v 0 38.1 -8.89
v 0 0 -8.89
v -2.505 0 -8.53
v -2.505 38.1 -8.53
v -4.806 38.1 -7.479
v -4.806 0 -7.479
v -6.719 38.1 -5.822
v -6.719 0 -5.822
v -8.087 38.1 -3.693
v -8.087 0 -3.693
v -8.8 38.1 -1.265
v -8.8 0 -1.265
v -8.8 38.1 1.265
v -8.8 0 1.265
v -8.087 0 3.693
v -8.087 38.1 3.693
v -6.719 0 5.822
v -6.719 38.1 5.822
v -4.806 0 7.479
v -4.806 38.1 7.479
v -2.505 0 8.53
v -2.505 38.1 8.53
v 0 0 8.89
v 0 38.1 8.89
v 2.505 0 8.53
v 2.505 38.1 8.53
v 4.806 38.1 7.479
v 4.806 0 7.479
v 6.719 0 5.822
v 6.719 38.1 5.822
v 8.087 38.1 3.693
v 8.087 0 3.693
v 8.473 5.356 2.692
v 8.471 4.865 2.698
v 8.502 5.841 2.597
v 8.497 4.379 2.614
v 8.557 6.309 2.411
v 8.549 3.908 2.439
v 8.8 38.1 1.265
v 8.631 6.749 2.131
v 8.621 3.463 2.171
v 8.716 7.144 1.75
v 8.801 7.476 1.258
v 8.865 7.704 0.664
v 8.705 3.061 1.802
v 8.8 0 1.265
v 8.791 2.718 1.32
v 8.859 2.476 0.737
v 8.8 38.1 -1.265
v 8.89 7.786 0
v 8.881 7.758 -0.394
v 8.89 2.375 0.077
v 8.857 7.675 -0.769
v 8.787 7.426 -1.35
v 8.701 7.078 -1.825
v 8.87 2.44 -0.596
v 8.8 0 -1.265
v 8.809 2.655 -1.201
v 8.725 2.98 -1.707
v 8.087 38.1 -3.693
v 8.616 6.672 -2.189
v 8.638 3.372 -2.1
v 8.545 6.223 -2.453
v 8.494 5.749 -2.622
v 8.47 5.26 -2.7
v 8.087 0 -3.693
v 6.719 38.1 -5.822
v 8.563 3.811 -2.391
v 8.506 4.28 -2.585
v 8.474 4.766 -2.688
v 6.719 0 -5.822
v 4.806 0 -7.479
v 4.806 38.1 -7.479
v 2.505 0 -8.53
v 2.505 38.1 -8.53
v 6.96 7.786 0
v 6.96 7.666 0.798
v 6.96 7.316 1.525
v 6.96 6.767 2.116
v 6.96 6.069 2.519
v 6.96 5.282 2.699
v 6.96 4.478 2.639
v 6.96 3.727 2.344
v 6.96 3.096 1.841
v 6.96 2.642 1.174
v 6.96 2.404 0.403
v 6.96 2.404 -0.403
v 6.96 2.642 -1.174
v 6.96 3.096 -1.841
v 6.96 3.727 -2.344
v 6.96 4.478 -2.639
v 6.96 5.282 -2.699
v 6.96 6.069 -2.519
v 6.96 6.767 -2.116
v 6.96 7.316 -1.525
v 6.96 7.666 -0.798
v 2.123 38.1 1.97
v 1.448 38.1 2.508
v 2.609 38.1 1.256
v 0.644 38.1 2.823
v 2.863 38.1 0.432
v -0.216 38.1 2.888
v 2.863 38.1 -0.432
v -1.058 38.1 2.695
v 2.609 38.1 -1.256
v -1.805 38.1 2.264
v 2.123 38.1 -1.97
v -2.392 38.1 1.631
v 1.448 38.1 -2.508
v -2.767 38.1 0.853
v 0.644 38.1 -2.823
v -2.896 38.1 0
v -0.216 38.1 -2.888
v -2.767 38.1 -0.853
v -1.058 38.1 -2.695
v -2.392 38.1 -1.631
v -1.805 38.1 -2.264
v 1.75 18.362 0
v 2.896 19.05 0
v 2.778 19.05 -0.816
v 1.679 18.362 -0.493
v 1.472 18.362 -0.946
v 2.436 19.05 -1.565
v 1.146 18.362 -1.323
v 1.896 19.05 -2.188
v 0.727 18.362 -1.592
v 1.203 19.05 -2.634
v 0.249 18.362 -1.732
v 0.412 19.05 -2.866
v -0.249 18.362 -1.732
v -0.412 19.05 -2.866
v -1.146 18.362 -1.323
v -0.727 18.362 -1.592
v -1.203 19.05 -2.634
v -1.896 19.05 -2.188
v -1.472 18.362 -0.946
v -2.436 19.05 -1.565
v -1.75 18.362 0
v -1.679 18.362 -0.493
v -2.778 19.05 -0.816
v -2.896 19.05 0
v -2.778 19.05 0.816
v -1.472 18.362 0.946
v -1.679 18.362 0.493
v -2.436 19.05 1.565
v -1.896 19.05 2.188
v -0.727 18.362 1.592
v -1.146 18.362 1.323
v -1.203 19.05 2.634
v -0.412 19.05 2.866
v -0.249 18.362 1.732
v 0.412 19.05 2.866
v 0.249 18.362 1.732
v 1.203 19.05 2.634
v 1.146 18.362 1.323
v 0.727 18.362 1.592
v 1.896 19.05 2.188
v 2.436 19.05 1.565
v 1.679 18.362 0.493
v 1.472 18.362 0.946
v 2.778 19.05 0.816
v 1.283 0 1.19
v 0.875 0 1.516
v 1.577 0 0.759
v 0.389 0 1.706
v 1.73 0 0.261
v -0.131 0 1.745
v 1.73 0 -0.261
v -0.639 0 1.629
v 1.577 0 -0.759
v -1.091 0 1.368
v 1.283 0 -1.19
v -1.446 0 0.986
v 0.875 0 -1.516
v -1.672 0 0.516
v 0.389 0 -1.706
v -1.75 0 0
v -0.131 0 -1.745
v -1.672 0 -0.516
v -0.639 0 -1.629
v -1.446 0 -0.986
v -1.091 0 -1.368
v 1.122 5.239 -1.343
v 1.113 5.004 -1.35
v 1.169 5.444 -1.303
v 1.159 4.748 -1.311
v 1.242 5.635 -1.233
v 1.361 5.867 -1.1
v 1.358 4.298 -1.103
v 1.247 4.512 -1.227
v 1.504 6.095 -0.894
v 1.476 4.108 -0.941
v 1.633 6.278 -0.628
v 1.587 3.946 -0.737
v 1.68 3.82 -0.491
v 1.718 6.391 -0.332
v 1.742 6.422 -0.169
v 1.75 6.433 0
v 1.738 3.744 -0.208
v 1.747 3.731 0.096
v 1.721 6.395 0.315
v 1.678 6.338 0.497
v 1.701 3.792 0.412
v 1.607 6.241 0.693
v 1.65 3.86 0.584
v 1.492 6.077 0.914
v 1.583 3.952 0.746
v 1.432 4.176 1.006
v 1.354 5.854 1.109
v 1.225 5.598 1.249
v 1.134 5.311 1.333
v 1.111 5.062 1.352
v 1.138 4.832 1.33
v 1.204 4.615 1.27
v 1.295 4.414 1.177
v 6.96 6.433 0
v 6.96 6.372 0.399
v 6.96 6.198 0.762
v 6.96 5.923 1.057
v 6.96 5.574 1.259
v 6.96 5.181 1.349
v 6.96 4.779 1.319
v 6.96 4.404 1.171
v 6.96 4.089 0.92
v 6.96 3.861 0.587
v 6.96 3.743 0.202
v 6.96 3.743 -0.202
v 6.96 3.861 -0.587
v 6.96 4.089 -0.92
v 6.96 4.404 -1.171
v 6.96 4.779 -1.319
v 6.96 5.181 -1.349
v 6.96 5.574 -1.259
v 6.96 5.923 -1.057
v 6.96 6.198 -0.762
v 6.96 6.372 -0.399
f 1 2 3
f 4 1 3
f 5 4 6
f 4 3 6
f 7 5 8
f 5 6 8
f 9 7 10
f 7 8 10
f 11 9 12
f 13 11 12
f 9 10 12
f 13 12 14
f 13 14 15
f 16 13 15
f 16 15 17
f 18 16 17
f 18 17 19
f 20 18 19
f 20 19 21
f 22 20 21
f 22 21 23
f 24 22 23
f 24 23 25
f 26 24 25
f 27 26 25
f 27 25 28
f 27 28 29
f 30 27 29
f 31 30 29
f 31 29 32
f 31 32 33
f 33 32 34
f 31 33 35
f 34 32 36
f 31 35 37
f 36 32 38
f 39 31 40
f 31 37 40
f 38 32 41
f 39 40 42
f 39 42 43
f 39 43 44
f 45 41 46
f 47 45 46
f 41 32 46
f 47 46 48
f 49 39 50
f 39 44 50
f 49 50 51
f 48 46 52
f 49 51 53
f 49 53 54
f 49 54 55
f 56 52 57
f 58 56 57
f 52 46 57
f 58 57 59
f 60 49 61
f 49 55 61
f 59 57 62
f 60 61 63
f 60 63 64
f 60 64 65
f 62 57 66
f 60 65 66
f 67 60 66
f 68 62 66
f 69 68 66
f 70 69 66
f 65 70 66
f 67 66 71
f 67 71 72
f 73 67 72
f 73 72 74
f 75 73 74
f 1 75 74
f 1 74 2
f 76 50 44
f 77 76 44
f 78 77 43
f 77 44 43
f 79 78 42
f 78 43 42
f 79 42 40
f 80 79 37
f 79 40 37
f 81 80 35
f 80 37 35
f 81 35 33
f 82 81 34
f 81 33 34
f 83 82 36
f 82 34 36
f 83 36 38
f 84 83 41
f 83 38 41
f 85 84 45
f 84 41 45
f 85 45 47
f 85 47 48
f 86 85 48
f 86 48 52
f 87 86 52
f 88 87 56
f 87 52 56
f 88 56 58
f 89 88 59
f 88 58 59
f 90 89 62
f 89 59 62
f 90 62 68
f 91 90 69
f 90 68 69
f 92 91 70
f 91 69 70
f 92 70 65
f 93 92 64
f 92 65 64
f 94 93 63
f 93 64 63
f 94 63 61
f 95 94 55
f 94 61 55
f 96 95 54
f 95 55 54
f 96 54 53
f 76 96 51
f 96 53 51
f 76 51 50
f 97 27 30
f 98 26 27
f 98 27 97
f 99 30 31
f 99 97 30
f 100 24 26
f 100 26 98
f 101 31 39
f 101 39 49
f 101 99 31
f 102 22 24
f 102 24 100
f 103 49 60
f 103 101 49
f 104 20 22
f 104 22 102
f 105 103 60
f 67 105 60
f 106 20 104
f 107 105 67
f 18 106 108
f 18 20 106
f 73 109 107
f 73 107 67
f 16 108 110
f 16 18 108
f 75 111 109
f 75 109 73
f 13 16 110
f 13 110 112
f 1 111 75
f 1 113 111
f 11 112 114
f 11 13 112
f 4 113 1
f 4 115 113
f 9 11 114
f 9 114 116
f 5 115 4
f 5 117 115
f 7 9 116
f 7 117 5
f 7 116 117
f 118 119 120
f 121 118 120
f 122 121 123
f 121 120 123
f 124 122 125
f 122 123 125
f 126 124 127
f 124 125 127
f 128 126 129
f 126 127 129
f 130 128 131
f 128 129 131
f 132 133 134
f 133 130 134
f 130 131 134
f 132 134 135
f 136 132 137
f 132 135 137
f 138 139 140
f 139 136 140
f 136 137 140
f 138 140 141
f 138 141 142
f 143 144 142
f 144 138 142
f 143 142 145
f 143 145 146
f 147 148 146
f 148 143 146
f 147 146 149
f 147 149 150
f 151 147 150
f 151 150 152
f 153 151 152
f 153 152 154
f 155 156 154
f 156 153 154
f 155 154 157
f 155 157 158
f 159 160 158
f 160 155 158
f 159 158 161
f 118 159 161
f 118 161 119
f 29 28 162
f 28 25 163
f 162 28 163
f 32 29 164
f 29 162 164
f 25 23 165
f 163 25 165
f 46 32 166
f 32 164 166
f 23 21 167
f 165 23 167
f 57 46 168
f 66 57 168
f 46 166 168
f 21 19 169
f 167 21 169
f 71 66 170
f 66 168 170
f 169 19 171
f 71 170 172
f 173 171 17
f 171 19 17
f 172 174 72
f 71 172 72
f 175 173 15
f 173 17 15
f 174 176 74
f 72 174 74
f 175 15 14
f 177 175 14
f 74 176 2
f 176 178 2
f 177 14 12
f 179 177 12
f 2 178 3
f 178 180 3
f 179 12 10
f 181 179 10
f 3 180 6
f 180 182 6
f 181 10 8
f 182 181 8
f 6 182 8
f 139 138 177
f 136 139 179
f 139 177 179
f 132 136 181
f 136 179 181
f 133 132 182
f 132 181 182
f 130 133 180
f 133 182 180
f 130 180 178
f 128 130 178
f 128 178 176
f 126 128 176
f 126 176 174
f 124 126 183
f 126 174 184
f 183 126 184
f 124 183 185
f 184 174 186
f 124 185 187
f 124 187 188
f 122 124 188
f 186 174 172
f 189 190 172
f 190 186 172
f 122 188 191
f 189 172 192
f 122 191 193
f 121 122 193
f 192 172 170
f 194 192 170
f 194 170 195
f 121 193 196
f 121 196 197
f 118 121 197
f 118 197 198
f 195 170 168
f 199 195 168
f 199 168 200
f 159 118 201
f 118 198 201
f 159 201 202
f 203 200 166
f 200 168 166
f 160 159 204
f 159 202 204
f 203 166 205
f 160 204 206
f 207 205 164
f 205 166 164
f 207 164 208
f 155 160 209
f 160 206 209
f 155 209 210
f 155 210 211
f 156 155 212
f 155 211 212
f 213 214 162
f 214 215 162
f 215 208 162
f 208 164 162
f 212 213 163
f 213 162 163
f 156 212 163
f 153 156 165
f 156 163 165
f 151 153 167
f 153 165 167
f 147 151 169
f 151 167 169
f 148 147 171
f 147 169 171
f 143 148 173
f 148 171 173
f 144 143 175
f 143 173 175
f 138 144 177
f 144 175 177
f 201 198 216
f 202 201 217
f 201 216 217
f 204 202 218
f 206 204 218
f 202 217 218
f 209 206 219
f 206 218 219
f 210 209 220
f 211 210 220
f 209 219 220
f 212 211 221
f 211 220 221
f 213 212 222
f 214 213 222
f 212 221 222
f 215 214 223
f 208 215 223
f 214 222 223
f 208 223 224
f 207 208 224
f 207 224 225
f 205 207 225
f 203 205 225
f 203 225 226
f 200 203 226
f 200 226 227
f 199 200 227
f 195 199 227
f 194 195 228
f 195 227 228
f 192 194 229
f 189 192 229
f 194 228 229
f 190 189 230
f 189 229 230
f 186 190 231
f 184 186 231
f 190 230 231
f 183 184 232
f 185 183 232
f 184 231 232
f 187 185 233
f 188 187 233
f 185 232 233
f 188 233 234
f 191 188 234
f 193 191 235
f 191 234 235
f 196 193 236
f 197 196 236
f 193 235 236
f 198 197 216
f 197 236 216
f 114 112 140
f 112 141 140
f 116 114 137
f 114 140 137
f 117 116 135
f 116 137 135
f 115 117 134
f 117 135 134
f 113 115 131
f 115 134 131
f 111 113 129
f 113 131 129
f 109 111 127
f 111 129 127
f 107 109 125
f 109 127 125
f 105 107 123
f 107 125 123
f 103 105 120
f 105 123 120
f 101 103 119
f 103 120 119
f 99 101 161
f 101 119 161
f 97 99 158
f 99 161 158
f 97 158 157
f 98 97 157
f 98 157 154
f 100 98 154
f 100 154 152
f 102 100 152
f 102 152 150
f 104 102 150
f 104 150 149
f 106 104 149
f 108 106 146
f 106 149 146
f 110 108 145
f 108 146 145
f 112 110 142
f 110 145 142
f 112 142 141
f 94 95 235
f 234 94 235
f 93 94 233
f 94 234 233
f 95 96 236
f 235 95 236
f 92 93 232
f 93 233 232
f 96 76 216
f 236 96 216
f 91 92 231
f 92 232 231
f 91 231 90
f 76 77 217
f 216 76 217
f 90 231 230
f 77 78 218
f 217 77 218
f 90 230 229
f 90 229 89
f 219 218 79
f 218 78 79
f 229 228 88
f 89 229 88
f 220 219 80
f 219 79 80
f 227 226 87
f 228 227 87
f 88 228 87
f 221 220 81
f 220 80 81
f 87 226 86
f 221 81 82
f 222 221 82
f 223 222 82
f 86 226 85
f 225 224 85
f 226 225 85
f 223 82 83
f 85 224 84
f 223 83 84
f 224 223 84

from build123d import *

# Parameters (mm, degrees)
SKETCH1_R                  = 8.89
BOSS_EXTRUDE1_DEPTH        = 38.1
F_3_0MM_DOWEL_HOLE2_D      = 3.5
F_12_CLEARANCE_HOLE1_D     = 5.7912
F_12_CLEARANCE_HOLE1_DEPTH = 19.05
F_12_CLEARANCE_HOLE1_TIP   = 1.739852008


# Read off the part's stored shape, not the designer's step: CBORE for #2 Button Head Cap Screw1
with BuildPart() as part:
    # Sketch1 → Boss-Extrude1 (new body)
    with BuildSketch(Plane(origin=(0, 0, 0), x_dir=(1, 0, 0), z_dir=(0, 1, 0))):
        with Locations(Location((0, 0, 0), (0, 0, 90))):
            Circle(SKETCH1_R)
    extrude(amount=BOSS_EXTRUDE1_DEPTH)

    # Ø3.0mm Dowel Hole2 (through all)
    with Locations(Plane(origin=(0, 38.1, 0), x_dir=(1, 0, 0), z_dir=(0, 1, 0))):
        with Locations((0, 0)):
            Hole(F_3_0MM_DOWEL_HOLE2_D / 2)

    # CBORE for #2 Button Head Cap Screw1 outl → CBORE for #2 Button Head Cap Screw1 (revolve, cut)
    with BuildSketch(Plane(origin=(0, 5.08, 0), x_dir=(0, 1, 0), z_dir=(0, 0, -1))):
        Polygon((1.35255, 6.9596), (2.70637, 6.9596), (2.70637, 8.890055176), (0, 8.890055176), (0, 1.110061146), (1.35255, 1.110061146), align=None)
    revolve(axis=Axis((0, 5.08, 0), (1, 0, 0)), mode=Mode.SUBTRACT)

    # #12 Clearance Hole1
    with Locations(Plane(origin=(0, 38.1, 0), x_dir=(1, 0, 0), z_dir=(0, 1, 0))):
        with Locations((0, 0)):
            Hole(F_12_CLEARANCE_HOLE1_D / 2, depth=F_12_CLEARANCE_HOLE1_DEPTH)
            with Locations((0, 0, -(F_12_CLEARANCE_HOLE1_DEPTH + F_12_CLEARANCE_HOLE1_TIP / 2))):  # 118° drill point
                Cone(0, F_12_CLEARANCE_HOLE1_D / 2, F_12_CLEARANCE_HOLE1_TIP, mode=Mode.SUBTRACT)


solid = part.part
